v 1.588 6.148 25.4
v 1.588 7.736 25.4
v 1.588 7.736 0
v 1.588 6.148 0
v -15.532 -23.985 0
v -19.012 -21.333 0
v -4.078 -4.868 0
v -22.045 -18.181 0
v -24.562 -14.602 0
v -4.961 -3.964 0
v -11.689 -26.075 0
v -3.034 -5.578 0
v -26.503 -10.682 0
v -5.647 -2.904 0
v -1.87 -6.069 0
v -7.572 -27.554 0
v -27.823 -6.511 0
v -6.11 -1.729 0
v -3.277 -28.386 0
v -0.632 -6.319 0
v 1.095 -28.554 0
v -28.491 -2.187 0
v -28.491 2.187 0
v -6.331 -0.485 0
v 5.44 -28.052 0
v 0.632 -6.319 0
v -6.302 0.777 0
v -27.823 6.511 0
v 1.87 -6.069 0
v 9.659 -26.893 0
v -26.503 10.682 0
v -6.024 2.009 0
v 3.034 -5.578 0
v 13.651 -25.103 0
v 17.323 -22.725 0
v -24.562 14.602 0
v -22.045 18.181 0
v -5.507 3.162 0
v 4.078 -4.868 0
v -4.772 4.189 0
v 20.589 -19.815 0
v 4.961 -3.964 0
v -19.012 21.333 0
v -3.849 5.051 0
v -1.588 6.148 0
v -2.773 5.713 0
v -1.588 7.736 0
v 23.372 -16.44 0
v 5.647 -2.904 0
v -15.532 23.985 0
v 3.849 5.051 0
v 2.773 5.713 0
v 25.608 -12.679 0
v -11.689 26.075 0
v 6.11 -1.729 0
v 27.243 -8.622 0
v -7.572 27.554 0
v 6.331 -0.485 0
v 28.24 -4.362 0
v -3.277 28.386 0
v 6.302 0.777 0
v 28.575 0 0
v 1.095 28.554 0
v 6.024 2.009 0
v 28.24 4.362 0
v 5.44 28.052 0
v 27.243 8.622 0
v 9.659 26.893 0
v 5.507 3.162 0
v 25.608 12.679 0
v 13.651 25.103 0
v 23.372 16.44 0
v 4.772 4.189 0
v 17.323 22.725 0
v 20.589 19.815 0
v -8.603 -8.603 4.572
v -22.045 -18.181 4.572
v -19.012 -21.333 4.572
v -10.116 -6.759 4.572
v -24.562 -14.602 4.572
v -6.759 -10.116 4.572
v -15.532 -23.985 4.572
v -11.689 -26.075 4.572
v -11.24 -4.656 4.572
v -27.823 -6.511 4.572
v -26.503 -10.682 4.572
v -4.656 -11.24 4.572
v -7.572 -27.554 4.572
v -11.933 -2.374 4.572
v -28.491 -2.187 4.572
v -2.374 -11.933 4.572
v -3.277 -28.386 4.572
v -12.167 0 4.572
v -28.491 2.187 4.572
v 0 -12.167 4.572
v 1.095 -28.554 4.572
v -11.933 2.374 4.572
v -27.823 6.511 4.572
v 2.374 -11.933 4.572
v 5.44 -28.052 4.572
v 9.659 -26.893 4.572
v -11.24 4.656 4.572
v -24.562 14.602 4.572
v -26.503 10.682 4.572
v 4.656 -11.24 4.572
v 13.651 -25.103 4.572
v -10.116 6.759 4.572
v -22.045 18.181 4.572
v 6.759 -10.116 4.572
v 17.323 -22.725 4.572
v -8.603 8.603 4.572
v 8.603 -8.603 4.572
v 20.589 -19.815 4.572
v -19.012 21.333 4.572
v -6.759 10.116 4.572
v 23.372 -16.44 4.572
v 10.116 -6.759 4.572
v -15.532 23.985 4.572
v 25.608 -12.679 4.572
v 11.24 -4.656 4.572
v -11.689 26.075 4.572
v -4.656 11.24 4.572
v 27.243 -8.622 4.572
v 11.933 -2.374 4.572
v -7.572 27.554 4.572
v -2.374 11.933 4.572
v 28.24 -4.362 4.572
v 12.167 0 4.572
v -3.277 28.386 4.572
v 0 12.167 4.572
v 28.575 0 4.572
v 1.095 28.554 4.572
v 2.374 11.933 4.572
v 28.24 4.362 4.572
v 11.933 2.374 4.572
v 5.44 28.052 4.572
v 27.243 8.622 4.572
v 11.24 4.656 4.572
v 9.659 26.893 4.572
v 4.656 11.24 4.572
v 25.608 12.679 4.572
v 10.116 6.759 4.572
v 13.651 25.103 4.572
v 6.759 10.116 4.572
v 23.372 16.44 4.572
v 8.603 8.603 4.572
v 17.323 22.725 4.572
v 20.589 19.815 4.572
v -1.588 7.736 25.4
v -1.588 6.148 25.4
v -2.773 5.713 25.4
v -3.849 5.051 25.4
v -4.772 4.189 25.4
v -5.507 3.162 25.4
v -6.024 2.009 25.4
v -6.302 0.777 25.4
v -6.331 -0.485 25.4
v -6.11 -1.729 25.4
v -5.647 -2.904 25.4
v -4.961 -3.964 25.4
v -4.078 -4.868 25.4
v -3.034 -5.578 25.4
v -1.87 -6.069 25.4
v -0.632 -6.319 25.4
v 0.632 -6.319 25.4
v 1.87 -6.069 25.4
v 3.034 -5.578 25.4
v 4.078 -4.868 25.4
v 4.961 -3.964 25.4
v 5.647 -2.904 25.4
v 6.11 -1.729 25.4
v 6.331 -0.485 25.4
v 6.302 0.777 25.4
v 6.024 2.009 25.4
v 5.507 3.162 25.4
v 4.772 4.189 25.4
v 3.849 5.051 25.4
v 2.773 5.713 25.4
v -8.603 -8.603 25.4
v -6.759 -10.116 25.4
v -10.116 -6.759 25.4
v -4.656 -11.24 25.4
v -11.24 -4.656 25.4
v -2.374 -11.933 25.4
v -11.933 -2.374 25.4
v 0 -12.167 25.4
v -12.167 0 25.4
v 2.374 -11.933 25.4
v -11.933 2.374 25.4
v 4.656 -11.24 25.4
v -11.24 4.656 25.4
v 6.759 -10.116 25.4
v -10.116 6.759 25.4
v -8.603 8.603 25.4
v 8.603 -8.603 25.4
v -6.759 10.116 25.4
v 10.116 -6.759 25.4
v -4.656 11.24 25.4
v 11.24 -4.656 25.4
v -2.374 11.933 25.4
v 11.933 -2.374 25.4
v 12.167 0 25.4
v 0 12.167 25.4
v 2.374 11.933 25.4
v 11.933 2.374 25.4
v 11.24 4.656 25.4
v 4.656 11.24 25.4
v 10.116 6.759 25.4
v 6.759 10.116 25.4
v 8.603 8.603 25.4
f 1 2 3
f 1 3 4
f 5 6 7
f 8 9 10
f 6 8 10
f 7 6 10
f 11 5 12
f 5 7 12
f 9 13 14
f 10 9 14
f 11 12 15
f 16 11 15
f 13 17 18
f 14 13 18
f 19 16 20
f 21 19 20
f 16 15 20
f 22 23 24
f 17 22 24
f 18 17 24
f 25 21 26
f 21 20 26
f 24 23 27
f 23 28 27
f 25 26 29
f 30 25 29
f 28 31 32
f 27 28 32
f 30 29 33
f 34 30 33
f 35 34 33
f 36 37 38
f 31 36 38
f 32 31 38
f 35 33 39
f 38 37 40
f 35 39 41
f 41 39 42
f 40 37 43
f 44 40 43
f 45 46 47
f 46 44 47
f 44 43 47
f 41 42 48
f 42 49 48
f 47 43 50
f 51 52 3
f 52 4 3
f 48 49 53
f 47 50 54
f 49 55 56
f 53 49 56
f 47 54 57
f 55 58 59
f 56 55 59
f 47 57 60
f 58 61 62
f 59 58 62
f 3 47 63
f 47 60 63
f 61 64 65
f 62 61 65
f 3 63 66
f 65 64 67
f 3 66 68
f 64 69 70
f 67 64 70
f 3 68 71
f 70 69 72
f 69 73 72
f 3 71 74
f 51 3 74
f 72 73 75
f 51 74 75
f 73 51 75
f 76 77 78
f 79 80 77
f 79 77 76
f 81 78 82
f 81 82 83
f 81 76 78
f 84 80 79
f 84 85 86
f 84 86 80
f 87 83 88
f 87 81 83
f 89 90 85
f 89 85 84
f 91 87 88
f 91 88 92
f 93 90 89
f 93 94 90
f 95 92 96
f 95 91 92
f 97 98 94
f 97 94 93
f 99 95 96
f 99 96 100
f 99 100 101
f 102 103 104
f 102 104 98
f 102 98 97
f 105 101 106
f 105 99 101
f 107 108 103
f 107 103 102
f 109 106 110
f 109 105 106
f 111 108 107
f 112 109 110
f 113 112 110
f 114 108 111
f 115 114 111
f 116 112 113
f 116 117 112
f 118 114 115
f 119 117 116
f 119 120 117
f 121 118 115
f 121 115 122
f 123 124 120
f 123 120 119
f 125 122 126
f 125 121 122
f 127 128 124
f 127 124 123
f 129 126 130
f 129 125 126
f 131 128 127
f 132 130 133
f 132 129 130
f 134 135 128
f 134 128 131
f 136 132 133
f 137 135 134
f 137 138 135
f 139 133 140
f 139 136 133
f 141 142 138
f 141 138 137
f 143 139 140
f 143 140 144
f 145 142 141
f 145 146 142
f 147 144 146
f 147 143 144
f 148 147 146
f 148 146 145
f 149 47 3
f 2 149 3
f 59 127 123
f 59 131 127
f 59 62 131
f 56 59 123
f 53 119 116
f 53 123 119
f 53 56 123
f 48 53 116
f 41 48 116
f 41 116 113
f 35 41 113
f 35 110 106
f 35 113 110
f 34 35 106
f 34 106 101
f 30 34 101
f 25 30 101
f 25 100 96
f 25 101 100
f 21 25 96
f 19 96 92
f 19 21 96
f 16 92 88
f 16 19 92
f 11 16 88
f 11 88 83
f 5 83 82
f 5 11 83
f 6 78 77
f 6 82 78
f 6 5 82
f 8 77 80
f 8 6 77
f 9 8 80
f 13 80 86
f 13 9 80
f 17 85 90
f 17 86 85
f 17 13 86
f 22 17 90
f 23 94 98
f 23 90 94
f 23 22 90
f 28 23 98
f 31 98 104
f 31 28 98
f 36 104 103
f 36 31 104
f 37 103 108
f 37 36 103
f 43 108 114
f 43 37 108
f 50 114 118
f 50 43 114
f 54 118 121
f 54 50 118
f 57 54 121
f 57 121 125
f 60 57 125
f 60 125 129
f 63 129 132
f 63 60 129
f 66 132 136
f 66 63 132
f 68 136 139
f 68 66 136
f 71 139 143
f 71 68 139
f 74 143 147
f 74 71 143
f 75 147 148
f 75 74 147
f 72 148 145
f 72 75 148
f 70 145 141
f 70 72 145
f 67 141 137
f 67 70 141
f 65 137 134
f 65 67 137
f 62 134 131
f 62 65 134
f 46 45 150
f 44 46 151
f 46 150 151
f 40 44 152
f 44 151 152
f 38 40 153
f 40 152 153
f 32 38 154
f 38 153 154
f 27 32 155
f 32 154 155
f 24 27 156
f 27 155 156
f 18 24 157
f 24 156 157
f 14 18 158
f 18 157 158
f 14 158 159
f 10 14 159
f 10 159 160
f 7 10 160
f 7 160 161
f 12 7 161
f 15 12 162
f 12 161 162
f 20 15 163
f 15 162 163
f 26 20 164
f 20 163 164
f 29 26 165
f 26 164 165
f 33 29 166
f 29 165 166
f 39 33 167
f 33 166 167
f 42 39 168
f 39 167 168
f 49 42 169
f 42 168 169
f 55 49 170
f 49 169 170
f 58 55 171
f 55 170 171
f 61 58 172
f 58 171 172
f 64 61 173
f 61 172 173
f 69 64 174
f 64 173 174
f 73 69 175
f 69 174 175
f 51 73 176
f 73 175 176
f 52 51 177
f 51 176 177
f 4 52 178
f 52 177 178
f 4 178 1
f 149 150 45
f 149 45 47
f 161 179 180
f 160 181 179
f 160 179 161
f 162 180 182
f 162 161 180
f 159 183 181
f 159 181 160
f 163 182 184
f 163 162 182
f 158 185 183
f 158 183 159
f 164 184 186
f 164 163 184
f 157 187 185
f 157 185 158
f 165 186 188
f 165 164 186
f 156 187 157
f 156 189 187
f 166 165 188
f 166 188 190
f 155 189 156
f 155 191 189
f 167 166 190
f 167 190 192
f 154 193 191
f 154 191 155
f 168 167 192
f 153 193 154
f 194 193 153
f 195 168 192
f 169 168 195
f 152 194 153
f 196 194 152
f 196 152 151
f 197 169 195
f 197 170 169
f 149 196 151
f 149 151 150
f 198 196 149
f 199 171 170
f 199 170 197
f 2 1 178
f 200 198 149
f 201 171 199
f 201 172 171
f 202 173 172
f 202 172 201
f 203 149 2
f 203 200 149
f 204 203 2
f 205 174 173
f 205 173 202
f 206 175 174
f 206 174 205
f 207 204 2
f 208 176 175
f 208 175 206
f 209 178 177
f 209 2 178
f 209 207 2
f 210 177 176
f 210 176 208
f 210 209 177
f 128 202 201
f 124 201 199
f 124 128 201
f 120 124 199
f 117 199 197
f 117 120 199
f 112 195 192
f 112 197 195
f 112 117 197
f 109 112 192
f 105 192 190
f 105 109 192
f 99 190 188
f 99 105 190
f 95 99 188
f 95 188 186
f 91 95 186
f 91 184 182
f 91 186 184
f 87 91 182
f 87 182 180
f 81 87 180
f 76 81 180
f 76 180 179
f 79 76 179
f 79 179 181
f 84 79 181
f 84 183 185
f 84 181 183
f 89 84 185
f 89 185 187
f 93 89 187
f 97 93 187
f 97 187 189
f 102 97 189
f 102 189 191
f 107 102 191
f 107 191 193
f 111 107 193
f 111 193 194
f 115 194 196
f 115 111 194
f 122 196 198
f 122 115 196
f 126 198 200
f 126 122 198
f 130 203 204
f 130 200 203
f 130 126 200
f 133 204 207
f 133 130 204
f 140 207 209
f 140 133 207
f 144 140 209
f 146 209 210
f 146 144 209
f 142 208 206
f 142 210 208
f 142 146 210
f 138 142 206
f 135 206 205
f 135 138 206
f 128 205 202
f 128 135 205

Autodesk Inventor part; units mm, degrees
ref_plane "YZ Plane" through (0, 0, 0) normal (1, 0, 0) x (0, 1, 0)
ref_plane "XZ Plane" through (0, 0, 0) normal (0, 1, 0) x (-1, 0, 0)
ref_plane "XY Plane" through (0, 0, 0) normal (0, 0, 1) x (1, 0, 0)
sketch "Sketch1" plane through (0, 0, 0) normal (0, 0, 1) x (1, 0, 0)
  circle A0 centre (0, 0) radius 28.575
  dimension "d0" = 57.15
extrude "Extrusion1" add sketch "Sketch1" along normal blind 4.572
sketch "Sketch2" plane through (0, 0, 4.572) normal (0, 0, 1) x (1, 0, 0)
  circle A0 centre (0, 0) radius 28.575 projected
  circle A1 centre (0, 0) radius 12.1666
  dimension "d3" = 24.3332
extrude "Extrusion2" add sketch "Sketch2" along normal blind 20.828 contours A1
sketch "Sketch3" plane through (0, 0, 25.4) normal (0, 0, 1) x (1, 0, 0)
  circle A0 centre (0, 0) radius 12.1666 projected
  circle A1 centre (0, 0) radius 6.35
  line L0 (-1.5875, 7.7359) -> (1.5875, 7.7359)
  line L1 (1.5875, 7.7359) -> (1.5875, 4.5609)
  line L2 (1.5875, 4.5609) -> (-1.5875, 4.5609)
  line L3 (-1.5875, 4.5609) -> (-1.5875, 7.7359)
  point P0 (0, 7.7359)
  point P1 (-1.5875, 6.1484)
  dimension "d6" = 12.7
  dimension "d7" = 3.175
  dimension "d8" = 3.175
extrude "Extrusion3" cut sketch "Sketch3" against normal through all contours A1 L3 L2 L1 | L1 L2 L3 A1 | A1 L3 L0 L1
properties part number "Hub 500 key"
